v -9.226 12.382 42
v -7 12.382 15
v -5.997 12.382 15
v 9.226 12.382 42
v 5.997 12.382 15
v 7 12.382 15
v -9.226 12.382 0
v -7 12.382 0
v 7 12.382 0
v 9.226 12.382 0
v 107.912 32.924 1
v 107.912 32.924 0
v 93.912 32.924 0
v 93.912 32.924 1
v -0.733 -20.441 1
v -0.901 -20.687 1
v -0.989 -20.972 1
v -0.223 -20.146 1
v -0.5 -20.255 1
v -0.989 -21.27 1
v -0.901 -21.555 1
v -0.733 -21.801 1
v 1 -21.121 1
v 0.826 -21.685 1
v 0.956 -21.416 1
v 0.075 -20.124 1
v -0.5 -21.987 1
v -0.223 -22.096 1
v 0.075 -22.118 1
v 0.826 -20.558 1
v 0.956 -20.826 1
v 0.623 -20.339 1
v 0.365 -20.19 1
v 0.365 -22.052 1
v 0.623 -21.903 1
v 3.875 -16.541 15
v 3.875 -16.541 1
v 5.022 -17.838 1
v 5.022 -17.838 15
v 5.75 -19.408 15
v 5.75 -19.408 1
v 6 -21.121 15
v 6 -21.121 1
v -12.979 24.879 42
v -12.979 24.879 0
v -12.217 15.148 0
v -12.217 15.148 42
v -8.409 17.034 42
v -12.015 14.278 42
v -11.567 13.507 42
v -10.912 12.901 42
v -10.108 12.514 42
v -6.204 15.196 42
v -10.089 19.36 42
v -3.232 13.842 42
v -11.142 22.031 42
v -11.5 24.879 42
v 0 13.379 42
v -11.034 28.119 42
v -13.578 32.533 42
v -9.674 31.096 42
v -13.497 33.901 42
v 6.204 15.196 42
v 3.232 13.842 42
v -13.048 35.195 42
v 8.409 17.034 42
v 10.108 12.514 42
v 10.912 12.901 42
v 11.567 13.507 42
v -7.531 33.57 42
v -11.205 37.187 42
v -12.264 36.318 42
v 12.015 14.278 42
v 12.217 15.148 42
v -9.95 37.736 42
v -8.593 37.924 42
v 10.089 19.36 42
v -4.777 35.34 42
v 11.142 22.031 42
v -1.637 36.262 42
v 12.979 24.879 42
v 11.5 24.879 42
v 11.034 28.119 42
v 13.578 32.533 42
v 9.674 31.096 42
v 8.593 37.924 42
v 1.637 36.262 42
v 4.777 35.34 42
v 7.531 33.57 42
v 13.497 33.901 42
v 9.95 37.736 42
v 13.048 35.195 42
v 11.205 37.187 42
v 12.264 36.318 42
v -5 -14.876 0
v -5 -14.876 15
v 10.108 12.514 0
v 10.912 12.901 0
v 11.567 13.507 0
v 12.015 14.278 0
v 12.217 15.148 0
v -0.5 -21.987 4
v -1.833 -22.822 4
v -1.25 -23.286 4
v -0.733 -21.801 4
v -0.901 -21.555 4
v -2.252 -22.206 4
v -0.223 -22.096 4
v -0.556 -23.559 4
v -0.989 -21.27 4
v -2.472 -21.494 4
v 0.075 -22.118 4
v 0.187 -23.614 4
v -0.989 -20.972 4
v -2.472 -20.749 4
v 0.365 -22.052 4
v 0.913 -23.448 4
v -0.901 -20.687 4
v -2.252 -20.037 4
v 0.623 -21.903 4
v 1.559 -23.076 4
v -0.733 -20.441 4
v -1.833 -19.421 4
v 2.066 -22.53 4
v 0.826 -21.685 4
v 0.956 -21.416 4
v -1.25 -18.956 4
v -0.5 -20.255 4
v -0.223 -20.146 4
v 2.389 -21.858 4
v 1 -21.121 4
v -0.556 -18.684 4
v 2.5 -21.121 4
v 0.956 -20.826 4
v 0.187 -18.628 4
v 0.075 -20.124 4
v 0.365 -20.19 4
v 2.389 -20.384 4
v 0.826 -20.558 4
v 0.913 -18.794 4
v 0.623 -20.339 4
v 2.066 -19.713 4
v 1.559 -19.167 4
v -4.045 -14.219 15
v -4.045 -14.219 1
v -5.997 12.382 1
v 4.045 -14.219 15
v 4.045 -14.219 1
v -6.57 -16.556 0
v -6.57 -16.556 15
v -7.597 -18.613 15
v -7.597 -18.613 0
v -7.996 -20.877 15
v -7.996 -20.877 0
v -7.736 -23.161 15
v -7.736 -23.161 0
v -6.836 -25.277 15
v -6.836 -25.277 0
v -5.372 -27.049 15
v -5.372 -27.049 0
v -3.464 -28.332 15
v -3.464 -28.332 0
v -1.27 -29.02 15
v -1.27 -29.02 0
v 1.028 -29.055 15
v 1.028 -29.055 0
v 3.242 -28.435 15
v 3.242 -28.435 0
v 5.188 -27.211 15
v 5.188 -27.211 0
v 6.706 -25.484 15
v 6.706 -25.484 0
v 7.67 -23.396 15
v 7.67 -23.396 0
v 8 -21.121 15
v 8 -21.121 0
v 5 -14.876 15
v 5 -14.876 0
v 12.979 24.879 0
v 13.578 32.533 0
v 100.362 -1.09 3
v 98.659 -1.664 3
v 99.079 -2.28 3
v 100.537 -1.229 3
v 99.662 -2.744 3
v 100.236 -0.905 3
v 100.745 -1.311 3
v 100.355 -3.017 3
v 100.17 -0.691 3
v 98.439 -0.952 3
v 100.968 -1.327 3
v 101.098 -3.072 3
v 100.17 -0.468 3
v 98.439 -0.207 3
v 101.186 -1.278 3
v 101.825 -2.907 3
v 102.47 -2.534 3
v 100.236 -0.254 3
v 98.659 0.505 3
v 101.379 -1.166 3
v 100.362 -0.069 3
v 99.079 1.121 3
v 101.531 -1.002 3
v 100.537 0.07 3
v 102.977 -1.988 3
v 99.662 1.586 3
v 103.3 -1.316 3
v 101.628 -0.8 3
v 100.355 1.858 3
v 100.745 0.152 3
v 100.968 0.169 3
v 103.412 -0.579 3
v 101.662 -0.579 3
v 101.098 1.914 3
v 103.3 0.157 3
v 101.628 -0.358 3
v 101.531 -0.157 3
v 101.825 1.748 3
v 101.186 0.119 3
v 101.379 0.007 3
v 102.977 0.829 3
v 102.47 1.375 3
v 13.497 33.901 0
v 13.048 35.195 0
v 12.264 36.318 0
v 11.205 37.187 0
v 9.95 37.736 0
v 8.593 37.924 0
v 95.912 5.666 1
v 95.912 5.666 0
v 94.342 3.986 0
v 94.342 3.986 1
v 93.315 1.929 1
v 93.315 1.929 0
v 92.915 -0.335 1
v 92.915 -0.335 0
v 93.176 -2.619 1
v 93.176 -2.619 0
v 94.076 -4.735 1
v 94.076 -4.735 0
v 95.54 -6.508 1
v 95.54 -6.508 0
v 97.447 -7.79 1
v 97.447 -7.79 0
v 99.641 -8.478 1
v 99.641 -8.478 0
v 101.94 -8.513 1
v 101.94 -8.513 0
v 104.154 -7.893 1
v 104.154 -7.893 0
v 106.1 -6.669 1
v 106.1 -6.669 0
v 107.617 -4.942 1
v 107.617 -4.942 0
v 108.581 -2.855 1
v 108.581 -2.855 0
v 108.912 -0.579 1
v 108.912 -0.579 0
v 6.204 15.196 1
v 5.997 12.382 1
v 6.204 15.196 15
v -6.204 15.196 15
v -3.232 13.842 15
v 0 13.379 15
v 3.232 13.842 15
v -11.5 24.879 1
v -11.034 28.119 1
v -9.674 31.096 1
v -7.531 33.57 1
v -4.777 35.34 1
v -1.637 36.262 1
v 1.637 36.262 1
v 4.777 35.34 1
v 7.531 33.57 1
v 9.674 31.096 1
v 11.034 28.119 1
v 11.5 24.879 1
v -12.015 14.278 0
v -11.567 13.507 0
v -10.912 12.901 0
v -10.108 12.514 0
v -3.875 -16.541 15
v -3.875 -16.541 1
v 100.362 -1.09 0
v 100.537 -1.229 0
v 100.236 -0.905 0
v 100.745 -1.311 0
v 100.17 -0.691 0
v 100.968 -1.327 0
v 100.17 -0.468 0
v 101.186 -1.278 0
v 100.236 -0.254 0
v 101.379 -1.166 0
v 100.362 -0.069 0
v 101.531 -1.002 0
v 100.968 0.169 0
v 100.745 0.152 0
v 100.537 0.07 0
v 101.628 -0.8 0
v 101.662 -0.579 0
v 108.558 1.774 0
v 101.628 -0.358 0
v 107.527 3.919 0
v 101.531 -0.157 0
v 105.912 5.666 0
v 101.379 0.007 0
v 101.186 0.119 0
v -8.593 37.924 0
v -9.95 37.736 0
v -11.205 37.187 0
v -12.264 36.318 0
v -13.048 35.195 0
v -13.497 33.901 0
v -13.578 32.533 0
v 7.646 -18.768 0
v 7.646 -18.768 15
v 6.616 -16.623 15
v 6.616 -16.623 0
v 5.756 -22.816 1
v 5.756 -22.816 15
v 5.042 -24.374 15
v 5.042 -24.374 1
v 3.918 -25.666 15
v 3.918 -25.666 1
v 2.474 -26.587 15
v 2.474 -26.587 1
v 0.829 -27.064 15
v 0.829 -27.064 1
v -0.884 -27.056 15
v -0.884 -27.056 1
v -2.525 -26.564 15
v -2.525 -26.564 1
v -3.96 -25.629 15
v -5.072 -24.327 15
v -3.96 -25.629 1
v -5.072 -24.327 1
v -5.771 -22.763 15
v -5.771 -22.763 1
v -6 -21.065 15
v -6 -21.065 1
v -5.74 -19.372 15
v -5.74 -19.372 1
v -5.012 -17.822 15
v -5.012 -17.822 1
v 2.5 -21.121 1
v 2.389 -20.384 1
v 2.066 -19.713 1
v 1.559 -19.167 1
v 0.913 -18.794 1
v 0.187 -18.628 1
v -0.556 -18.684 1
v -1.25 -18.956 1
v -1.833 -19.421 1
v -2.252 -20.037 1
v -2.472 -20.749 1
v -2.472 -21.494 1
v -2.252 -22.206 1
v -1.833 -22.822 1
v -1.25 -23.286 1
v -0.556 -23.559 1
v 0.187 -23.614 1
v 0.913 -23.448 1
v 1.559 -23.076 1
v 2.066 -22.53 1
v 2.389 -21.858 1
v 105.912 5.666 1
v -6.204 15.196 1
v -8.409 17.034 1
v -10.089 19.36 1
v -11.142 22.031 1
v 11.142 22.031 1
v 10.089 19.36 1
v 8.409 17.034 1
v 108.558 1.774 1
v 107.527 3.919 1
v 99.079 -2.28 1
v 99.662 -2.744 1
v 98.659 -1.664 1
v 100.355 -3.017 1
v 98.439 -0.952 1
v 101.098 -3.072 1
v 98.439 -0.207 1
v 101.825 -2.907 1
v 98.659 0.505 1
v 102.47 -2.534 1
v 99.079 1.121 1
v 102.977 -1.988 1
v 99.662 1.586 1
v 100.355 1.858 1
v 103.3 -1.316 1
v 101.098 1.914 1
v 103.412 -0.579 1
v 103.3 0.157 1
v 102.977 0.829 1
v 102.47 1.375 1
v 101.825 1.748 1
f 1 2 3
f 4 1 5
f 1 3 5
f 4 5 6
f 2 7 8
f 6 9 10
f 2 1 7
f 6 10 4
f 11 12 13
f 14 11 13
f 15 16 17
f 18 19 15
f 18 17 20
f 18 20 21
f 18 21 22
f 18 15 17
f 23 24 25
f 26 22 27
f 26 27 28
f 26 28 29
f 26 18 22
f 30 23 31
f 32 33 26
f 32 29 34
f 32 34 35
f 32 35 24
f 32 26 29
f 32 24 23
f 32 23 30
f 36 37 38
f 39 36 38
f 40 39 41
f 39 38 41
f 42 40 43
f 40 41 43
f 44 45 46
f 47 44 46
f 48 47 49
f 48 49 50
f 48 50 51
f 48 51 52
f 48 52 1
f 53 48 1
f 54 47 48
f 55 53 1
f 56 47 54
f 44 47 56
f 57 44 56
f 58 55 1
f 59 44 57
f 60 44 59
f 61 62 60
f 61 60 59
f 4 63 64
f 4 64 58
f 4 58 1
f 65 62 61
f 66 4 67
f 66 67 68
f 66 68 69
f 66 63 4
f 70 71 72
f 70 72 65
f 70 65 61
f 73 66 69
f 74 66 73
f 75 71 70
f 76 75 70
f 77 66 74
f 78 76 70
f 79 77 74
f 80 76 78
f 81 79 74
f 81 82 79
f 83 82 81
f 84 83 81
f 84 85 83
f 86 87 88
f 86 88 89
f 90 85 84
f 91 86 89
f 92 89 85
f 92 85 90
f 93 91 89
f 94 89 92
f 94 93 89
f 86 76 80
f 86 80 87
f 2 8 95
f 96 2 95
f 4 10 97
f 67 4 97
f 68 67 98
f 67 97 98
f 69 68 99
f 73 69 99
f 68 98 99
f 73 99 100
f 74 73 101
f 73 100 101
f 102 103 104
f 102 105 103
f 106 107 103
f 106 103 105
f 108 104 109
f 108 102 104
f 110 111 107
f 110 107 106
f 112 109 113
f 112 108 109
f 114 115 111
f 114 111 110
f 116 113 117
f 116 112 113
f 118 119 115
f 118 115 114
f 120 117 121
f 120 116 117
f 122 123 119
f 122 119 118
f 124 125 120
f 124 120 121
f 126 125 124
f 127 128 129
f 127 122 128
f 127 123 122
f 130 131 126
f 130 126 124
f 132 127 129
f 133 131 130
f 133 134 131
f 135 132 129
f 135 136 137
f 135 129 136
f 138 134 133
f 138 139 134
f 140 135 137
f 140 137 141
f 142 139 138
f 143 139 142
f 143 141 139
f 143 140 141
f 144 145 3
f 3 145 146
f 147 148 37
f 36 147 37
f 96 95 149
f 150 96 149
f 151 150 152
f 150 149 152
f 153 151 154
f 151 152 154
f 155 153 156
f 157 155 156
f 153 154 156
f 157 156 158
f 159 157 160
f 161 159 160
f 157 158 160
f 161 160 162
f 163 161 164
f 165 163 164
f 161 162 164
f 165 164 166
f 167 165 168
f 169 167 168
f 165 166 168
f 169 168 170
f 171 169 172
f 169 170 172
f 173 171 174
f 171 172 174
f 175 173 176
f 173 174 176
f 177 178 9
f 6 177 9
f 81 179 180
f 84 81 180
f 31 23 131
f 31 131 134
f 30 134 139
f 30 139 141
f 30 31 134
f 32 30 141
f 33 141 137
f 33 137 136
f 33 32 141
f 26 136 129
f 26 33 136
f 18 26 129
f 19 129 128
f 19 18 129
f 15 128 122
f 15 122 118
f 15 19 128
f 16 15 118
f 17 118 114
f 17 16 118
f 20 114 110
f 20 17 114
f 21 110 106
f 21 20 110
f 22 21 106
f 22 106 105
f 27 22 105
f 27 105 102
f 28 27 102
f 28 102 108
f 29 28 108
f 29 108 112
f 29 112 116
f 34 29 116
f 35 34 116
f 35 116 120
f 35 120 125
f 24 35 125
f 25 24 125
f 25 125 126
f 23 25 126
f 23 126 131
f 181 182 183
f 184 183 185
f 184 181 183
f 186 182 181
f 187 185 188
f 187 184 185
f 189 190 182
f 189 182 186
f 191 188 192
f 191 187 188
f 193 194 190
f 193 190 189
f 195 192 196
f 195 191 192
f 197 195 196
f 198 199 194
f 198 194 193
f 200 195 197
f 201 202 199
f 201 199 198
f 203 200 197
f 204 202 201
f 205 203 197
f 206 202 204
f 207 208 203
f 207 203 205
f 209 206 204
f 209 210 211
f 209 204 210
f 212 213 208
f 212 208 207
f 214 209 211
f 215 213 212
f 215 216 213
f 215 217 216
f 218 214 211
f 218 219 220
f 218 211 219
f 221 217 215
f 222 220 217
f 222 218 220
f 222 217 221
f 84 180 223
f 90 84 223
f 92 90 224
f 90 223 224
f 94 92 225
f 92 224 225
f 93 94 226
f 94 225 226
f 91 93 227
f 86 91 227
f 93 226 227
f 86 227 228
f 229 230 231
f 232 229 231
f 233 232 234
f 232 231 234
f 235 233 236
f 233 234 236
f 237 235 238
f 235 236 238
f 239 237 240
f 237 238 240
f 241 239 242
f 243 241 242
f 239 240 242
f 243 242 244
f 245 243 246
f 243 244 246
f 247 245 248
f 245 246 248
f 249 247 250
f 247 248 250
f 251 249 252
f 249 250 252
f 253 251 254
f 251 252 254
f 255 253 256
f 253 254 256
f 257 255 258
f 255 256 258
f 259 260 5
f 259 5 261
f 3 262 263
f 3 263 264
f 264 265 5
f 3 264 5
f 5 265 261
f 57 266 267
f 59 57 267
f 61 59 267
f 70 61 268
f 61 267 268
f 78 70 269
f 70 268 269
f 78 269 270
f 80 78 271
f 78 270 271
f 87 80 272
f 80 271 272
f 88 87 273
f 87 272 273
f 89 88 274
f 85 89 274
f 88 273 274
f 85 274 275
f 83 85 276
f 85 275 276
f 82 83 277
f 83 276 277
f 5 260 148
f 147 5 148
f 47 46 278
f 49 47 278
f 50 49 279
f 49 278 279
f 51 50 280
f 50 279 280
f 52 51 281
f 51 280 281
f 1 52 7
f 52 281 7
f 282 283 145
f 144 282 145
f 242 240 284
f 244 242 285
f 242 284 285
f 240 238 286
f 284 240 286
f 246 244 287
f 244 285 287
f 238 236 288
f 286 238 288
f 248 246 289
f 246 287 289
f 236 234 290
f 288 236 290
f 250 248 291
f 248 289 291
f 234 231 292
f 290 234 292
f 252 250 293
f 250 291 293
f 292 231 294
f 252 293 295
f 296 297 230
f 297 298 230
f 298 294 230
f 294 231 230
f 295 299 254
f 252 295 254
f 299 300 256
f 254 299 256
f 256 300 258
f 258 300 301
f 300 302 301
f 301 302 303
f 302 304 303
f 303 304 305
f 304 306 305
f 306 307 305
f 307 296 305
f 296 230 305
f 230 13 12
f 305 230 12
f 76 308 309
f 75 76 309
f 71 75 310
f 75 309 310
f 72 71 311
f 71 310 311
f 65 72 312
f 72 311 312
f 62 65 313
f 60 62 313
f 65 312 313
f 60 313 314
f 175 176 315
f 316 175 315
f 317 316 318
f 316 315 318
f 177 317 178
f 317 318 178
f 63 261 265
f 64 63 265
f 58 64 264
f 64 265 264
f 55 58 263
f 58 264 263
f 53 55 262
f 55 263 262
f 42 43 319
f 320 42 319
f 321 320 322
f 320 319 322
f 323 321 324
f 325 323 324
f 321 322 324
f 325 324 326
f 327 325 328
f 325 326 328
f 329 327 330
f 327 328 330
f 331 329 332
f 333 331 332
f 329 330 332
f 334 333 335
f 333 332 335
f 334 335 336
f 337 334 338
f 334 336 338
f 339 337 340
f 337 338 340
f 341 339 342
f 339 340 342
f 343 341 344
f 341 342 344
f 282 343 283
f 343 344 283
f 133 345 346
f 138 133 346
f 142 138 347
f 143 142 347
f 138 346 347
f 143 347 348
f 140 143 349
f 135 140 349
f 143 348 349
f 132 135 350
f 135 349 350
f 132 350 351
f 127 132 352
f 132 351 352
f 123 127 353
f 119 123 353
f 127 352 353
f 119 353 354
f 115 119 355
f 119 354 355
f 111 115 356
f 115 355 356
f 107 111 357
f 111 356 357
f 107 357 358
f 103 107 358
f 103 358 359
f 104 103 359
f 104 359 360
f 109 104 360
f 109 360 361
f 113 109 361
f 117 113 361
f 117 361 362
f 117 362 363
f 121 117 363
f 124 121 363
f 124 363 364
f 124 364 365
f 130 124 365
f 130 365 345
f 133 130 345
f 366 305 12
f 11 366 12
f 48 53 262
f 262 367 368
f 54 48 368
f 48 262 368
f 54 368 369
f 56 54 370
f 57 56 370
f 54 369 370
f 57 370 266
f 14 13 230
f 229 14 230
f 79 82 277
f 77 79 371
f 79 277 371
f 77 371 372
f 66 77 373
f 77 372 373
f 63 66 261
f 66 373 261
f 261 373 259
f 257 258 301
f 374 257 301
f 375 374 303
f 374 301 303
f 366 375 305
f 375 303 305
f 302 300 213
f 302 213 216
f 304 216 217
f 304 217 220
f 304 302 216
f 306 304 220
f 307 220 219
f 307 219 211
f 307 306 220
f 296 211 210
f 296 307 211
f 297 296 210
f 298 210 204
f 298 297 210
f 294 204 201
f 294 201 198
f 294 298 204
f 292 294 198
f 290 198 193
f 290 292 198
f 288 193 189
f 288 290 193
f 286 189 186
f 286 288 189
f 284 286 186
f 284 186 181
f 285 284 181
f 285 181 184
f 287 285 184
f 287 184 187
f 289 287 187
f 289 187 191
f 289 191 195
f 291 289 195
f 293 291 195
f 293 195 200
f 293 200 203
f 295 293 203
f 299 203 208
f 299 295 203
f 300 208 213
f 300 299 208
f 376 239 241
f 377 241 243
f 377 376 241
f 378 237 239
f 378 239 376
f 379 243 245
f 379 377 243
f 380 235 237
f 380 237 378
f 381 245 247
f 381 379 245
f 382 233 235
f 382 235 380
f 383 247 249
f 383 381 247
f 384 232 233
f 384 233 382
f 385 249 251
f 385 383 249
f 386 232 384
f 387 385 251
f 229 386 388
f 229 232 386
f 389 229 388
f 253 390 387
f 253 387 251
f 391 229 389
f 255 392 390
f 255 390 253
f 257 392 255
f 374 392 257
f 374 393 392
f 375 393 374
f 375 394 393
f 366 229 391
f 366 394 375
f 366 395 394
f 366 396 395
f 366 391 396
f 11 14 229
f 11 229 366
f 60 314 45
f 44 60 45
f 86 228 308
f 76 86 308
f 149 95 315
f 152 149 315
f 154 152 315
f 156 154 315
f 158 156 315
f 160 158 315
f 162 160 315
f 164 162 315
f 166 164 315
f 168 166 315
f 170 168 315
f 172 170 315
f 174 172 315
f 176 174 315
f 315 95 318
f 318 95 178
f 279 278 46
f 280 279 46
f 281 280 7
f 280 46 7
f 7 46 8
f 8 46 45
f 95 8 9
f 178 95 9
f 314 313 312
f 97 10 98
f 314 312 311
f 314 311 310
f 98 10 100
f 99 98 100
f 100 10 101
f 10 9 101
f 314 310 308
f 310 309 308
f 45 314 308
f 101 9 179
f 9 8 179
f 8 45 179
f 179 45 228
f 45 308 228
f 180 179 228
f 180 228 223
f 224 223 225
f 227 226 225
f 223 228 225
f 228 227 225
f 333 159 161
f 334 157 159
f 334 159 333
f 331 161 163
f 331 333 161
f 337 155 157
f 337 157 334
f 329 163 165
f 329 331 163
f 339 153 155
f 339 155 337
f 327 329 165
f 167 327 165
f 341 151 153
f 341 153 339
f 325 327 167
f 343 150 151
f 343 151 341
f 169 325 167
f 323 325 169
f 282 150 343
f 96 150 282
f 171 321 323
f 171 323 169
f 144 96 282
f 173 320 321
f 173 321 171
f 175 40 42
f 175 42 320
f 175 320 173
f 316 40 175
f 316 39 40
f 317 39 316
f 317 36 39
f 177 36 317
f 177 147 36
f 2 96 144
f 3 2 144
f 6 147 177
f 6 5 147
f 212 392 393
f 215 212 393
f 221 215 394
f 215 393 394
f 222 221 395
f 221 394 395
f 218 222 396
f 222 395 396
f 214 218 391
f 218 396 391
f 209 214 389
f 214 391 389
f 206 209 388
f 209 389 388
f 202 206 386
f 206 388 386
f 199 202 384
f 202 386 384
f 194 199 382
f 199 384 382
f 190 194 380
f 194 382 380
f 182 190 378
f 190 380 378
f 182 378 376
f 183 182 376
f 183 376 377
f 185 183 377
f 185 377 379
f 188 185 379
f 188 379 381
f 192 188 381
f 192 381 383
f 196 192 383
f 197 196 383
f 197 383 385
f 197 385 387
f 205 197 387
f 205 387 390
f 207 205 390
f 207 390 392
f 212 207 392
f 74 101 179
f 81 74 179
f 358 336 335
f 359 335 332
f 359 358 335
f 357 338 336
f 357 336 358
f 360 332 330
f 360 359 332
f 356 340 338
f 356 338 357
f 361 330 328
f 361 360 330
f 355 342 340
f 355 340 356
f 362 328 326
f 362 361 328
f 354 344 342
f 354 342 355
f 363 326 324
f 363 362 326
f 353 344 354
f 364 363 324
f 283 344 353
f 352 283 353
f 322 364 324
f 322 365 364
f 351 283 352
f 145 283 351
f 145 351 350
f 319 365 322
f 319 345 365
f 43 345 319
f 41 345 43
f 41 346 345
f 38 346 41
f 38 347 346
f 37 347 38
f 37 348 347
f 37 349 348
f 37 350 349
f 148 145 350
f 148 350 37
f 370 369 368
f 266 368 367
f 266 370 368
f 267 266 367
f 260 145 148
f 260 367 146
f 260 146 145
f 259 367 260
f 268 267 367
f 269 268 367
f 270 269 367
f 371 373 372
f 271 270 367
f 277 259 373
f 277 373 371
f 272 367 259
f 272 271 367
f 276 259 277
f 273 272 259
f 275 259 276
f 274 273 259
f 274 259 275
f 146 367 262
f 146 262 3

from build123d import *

# Parameters (mm, degrees)
F1_DEPTH  = 42
F2_DEPTH  = 15
F3_DEPTH  = 42
F4_DEPTH  = 15
F5_DEPTH  = 1
F0_R      = 2.5
F6_DEPTH  = 1
F0_R_2    = 1
F7_DEPTH  = 4
F8_DEPTH  = 1
F9_DEPTH  = 1
F0_R_3    = 0.75
F10_DEPTH = 3


with BuildPart() as f1:
    # F0 (on Top) → F1 (new body)
    with BuildSketch(Plane.XY):
        with BuildLine():
            Line((-12.9785589716, 24.8787840627), (-11.5, 24.8787840627))
            ThreePointArc((-11.5, 24.8787840627), (0, 36.3787840627), (11.5, 24.8787840627))
            Line((11.5, 24.8787840627), (12.9785589716, 24.8787840627))
            Line((12.9785589716, 24.8787840627), (13.5779219878, 32.533194811))
            ThreePointArc((13.5779219878, 32.533194811), (12.264120187, 36.318246043), (8.593180242, 37.923514843))
            Line((8.593180242, 37.923514843), (-8.593180242, 37.923514843))
            ThreePointArc((-8.593180242, 37.923514843), (-12.264120187, 36.318246043), (-13.5779219878, 32.533194811))
            Line((-13.5779219878, 32.533194811), (-12.9785589716, 24.8787840627))
        make_face()
        with BuildLine():
            ThreePointArc((11.5, 24.8787840627), (10.0894369384, 19.3603366119), (6.2037804754, 15.1956488363))
            Line((6.2037804754, 15.1956488363), (5.997311801, 12.3816961423))
            Line((5.997311801, 12.3816961423), (7, 12.3816961423))
            Line((7, 12.3816961423), (9.2257259033, 12.3816961423))
            ThreePointArc((9.2257259033, 12.3816961423), (11.2625646233, 13.1791321752), (12.2165709508, 15.1475041231))
            Line((12.2165709508, 15.1475041231), (12.9785589716, 24.8787840627))
            Line((12.9785589716, 24.8787840627), (11.5, 24.8787840627))
        make_face()
        with BuildLine():
            Line((-5.997311801, 12.3816961423), (-6.2037804754, 15.1956488363))
            ThreePointArc((-6.2037804754, 15.1956488363), (-10.0894369384, 19.3603366119), (-11.5, 24.8787840627))
            Line((-11.5, 24.8787840627), (-12.9785589716, 24.8787840627))
            Line((-12.9785589716, 24.8787840627), (-12.2165709508, 15.1475041231))
            ThreePointArc((-12.2165709508, 15.1475041231), (-11.2625646233, 13.1791321752), (-9.2257259033, 12.3816961423))
            Line((-9.2257259033, 12.3816961423), (-7, 12.3816961423))
            Line((-7, 12.3816961423), (-5.997311801, 12.3816961423))
        make_face()
    extrude(amount=F1_DEPTH)

    # F0 (on Top) → F2 (join)
    with BuildSketch(Plane.XY):
        with BuildLine():
            Line((-4.0454986584, -14.219481329), (-5.997311801, 12.3816961423))
            Line((-5.997311801, 12.3816961423), (-7, 12.3816961423))
            Line((-7, 12.3816961423), (-5, -14.8762179389))
            ThreePointArc((-5, -14.8762179389), (-4.5346540374, -14.5305473247), (-4.0454986584, -14.219481329))
        make_face()
        with BuildLine():
            Line((7, 12.3816961423), (5.997311801, 12.3816961423))
            Line((5.997311801, 12.3816961423), (4.0454986584, -14.219481329))
            ThreePointArc((4.0454986584, -14.219481329), (4.5346540374, -14.5305473247), (5, -14.8762179389))
            Line((5, -14.8762179389), (7, 12.3816961423))
        make_face()
        with BuildLine():
            Line((-3.8751972264, -16.5405122298), (-4.0454986584, -14.219481329))
            ThreePointArc((-4.0454986584, -14.219481329), (-4.5346540374, -14.5305473247), (-5, -14.8762179389))
            ThreePointArc((-5, -14.8762179389), (-3.4641016151, -28.3323184883), (8, -21.1212159373))
            ThreePointArc((8, -21.1212159373), (7.2111025509, -17.6571143222), (5, -14.8762179389))
            ThreePointArc((5, -14.8762179389), (4.5346540374, -14.5305473247), (4.0454986584, -14.219481329))
            Line((4.0454986584, -14.219481329), (3.8751972264, -16.5405122298))
            ThreePointArc((3.8751972264, -16.5405122298), (5.4429396175, -18.5964568754), (6, -21.1212159373))
            ThreePointArc((6, -21.1212159373), (-2.5247590619, -26.5641555548), (-3.8751972264, -16.5405122298))
        make_face()
    extrude(amount=F2_DEPTH)

    # F0 (on Top) → F3 (join)
    with BuildSketch(Plane.XY):
        with BuildLine():
            ThreePointArc((6.2037804754, 15.1956488363), (0, 13.3787840627), (-6.2037804754, 15.1956488363))
            Line((-6.2037804754, 15.1956488363), (-5.997311801, 12.3816961423))
            Line((-5.997311801, 12.3816961423), (5.997311801, 12.3816961423))
            Line((5.997311801, 12.3816961423), (6.2037804754, 15.1956488363))
        make_face()
    extrude(amount=F3_DEPTH)

    # F0 (on Top) → F4 (cut)
    with BuildSketch(Plane.XY):
        with BuildLine():
            ThreePointArc((6.2037804754, 15.1956488363), (0, 13.3787840627), (-6.2037804754, 15.1956488363))
            Line((-6.2037804754, 15.1956488363), (-5.997311801, 12.3816961423))
            Line((-5.997311801, 12.3816961423), (5.997311801, 12.3816961423))
            Line((5.997311801, 12.3816961423), (6.2037804754, 15.1956488363))
        make_face()
    extrude(amount=F4_DEPTH, mode=Mode.SUBTRACT)

    # F0 (on Top) → F5 (join)
    with BuildSketch(Plane.XY):
        with BuildLine():
            ThreePointArc((-11.5, 24.8787840627), (-10.0894369384, 19.3603366119), (-6.2037804754, 15.1956488363))
            ThreePointArc((-6.2037804754, 15.1956488363), (0, 13.3787840627), (6.2037804754, 15.1956488363))
            ThreePointArc((6.2037804754, 15.1956488363), (10.0894369384, 19.3603366119), (11.5, 24.8787840627))
            Line((11.5, 24.8787840627), (9.5, 24.8787840627))
            ThreePointArc((9.5, 24.8787840627), (0, 15.3787840627), (-9.5, 24.8787840627))
            Line((-9.5, 24.8787840627), (-11.5, 24.8787840627))
        make_face()
        with BuildLine():
            ThreePointArc((11.5, 24.8787840627), (0, 36.3787840627), (-11.5, 24.8787840627))
            Line((-11.5, 24.8787840627), (-9.5, 24.8787840627))
            ThreePointArc((-9.5, 24.8787840627), (0, 34.3787840627), (9.5, 24.8787840627))
            Line((9.5, 24.8787840627), (11.5, 24.8787840627))
        make_face()
        with BuildLine():
            Line((5.997311801, 12.3816961423), (-5.997311801, 12.3816961423))
            Line((-5.997311801, 12.3816961423), (-4.0454986584, -14.219481329))
            ThreePointArc((-4.0454986584, -14.219481329), (0, -13.1212159373), (4.0454986584, -14.219481329))
            Line((4.0454986584, -14.219481329), (5.997311801, 12.3816961423))
        make_face()
        with BuildLine():
            Line((0, 24.8787840627), (-9.5, 24.8787840627))
            ThreePointArc((-9.5, 24.8787840627), (0, 15.3787840627), (9.5, 24.8787840627))
            Line((9.5, 24.8787840627), (0, 24.8787840627))
        make_face()
        with BuildLine():
            ThreePointArc((9.5, 24.8787840627), (0, 34.3787840627), (-9.5, 24.8787840627))
            Line((-9.5, 24.8787840627), (0, 24.8787840627))
            Line((0, 24.8787840627), (9.5, 24.8787840627))
        make_face()
    extrude(amount=F5_DEPTH)

    # F0 (on Top) → F6 (join)
    with BuildSketch(Plane.XY):
        with BuildLine():
            Line((5.997311801, 12.3816961423), (-5.997311801, 12.3816961423))
            Line((-5.997311801, 12.3816961423), (-4.0454986584, -14.219481329))
            ThreePointArc((-4.0454986584, -14.219481329), (0, -13.1212159373), (4.0454986584, -14.219481329))
            Line((4.0454986584, -14.219481329), (5.997311801, 12.3816961423))
        make_face()
        with BuildLine():
            ThreePointArc((3.8751972264, -16.5405122298), (0, -15.1212159373), (-3.8751972264, -16.5405122298))
            ThreePointArc((-3.8751972264, -16.5405122298), (-2.5247590619, -26.5641555548), (6, -21.1212159373))
            ThreePointArc((6, -21.1212159373), (5.4429396175, -18.5964568754), (3.8751972264, -16.5405122298))
        make_face()
        with Locations((0, -21.1212159373)):
            Circle(F0_R, mode=Mode.SUBTRACT)
        with BuildLine():
            ThreePointArc((4.0454986584, -14.219481329), (0, -13.1212159373), (-4.0454986584, -14.219481329))
            Line((-4.0454986584, -14.219481329), (-3.8751972264, -16.5405122298))
            ThreePointArc((-3.8751972264, -16.5405122298), (0, -15.1212159373), (3.8751972264, -16.5405122298))
            Line((3.8751972264, -16.5405122298), (4.0454986584, -14.219481329))
        make_face()
        with BuildLine():
            ThreePointArc((6.2037804754, 15.1956488363), (0, 13.3787840627), (-6.2037804754, 15.1956488363))
            Line((-6.2037804754, 15.1956488363), (-5.997311801, 12.3816961423))
            Line((-5.997311801, 12.3816961423), (5.997311801, 12.3816961423))
            Line((5.997311801, 12.3816961423), (6.2037804754, 15.1956488363))
        make_face()
    extrude(amount=F6_DEPTH)

    # F0 (on Top) → F7 (join)
    with BuildSketch(Plane.XY):
        with Locations((0, -21.1212159373)):
            Circle(F0_R)
        with Locations((0, -21.1212159373)):
            Circle(F0_R_2, mode=Mode.SUBTRACT)
    extrude(amount=F7_DEPTH)

    # F0 (on Top) → F8 (join)
    with BuildSketch(Plane.XY):
        with Locations((0, -21.1212159373)):
            Circle(F0_R_2)
    extrude(amount=F8_DEPTH)


with BuildPart() as f5:
    # F0 (on Top) → F5, piece 2 (new body)
    with BuildSketch(Plane.XY):
        with BuildLine():
            Line((106.908822805, 32.923514843), (94.914199203, 32.923514843))
            Line((94.914199203, 32.923514843), (96.8660123455, 6.3223373718))
            ThreePointArc((96.8660123455, 6.3223373718), (100.911511004, 7.4206027634), (104.9570096624, 6.3223373718))
            Line((104.9570096624, 6.3223373718), (106.908822805, 32.923514843))
        make_face()
    extrude(amount=F5_DEPTH)

    # F0 (on Top) → F9 (join)
    with BuildSketch(Plane.XY):
        with BuildLine():
            Line((96.8660123455, 6.3223373718), (94.914199203, 32.923514843))
            Line((94.914199203, 32.923514843), (93.911511004, 32.923514843))
            Line((93.911511004, 32.923514843), (95.911511004, 5.6656007618))
            ThreePointArc((95.911511004, 5.6656007618), (96.3768569666, 6.011271376), (96.8660123455, 6.3223373718))
        make_face()
        with BuildLine():
            Line((107.911511004, 32.923514843), (106.908822805, 32.923514843))
            Line((106.908822805, 32.923514843), (104.9570096624, 6.3223373718))
            ThreePointArc((104.9570096624, 6.3223373718), (105.4461650413, 6.011271376), (105.911511004, 5.6656007618))
            Line((105.911511004, 5.6656007618), (107.911511004, 32.923514843))
        make_face()
        with BuildLine():
            Line((106.908822805, 32.923514843), (94.914199203, 32.923514843))
            Line((94.914199203, 32.923514843), (96.8660123455, 6.3223373718))
            ThreePointArc((96.8660123455, 6.3223373718), (100.911511004, 7.4206027634), (104.9570096624, 6.3223373718))
            Line((104.9570096624, 6.3223373718), (106.908822805, 32.923514843))
        make_face()
        with BuildLine():
            ThreePointArc((104.9570096624, 6.3223373718), (100.911511004, 7.4206027634), (96.8660123455, 6.3223373718))
            Line((96.8660123455, 6.3223373718), (97.0363137775, 4.0013064709))
            ThreePointArc((97.0363137775, 4.0013064709), (100.911511004, 5.4206027634), (104.7867082304, 4.0013064709))
            Line((104.7867082304, 4.0013064709), (104.9570096624, 6.3223373718))
        make_face()
        with BuildLine():
            Line((97.0363137775, 4.0013064709), (96.8660123455, 6.3223373718))
            ThreePointArc((96.8660123455, 6.3223373718), (96.3768569666, 6.011271376), (95.911511004, 5.6656007618))
            ThreePointArc((95.911511004, 5.6656007618), (97.4474093888, -7.7904997875), (108.911511004, -0.5793972366))
            ThreePointArc((108.911511004, -0.5793972366), (108.1226135549, 2.8847043785), (105.911511004, 5.6656007618))
            ThreePointArc((105.911511004, 5.6656007618), (105.4461650413, 6.011271376), (104.9570096624, 6.3223373718))
            Line((104.9570096624, 6.3223373718), (104.7867082304, 4.0013064709))
            ThreePointArc((104.7867082304, 4.0013064709), (106.3544506214, 1.9453618253), (106.911511004, -0.5793972366))
            ThreePointArc((106.911511004, -0.5793972366), (98.3867519421, -6.0223368541), (97.0363137775, 4.0013064709))
        make_face()
        with BuildLine():
            ThreePointArc((104.7867082304, 4.0013064709), (100.911511004, 5.4206027634), (97.0363137775, 4.0013064709))
            ThreePointArc((97.0363137775, 4.0013064709), (98.3867519421, -6.0223368541), (106.911511004, -0.5793972366))
            ThreePointArc((106.911511004, -0.5793972366), (106.3544506214, 1.9453618253), (104.7867082304, 4.0013064709))
        make_face()
        with Locations((100.911511004, -0.5793972366)):
            Circle(F0_R, mode=Mode.SUBTRACT)
    extrude(amount=F9_DEPTH)

    # F0 (on Top) → F10 (join)
    with BuildSketch(Plane.XY):
        with Locations((100.911511004, -0.5793972366)):
            Circle(F0_R)
        with Locations((100.911511004, -0.5793972366)):
            Circle(F0_R_3, mode=Mode.SUBTRACT)
    extrude(amount=F10_DEPTH)


solid = Compound([f1.part, f5.part])
